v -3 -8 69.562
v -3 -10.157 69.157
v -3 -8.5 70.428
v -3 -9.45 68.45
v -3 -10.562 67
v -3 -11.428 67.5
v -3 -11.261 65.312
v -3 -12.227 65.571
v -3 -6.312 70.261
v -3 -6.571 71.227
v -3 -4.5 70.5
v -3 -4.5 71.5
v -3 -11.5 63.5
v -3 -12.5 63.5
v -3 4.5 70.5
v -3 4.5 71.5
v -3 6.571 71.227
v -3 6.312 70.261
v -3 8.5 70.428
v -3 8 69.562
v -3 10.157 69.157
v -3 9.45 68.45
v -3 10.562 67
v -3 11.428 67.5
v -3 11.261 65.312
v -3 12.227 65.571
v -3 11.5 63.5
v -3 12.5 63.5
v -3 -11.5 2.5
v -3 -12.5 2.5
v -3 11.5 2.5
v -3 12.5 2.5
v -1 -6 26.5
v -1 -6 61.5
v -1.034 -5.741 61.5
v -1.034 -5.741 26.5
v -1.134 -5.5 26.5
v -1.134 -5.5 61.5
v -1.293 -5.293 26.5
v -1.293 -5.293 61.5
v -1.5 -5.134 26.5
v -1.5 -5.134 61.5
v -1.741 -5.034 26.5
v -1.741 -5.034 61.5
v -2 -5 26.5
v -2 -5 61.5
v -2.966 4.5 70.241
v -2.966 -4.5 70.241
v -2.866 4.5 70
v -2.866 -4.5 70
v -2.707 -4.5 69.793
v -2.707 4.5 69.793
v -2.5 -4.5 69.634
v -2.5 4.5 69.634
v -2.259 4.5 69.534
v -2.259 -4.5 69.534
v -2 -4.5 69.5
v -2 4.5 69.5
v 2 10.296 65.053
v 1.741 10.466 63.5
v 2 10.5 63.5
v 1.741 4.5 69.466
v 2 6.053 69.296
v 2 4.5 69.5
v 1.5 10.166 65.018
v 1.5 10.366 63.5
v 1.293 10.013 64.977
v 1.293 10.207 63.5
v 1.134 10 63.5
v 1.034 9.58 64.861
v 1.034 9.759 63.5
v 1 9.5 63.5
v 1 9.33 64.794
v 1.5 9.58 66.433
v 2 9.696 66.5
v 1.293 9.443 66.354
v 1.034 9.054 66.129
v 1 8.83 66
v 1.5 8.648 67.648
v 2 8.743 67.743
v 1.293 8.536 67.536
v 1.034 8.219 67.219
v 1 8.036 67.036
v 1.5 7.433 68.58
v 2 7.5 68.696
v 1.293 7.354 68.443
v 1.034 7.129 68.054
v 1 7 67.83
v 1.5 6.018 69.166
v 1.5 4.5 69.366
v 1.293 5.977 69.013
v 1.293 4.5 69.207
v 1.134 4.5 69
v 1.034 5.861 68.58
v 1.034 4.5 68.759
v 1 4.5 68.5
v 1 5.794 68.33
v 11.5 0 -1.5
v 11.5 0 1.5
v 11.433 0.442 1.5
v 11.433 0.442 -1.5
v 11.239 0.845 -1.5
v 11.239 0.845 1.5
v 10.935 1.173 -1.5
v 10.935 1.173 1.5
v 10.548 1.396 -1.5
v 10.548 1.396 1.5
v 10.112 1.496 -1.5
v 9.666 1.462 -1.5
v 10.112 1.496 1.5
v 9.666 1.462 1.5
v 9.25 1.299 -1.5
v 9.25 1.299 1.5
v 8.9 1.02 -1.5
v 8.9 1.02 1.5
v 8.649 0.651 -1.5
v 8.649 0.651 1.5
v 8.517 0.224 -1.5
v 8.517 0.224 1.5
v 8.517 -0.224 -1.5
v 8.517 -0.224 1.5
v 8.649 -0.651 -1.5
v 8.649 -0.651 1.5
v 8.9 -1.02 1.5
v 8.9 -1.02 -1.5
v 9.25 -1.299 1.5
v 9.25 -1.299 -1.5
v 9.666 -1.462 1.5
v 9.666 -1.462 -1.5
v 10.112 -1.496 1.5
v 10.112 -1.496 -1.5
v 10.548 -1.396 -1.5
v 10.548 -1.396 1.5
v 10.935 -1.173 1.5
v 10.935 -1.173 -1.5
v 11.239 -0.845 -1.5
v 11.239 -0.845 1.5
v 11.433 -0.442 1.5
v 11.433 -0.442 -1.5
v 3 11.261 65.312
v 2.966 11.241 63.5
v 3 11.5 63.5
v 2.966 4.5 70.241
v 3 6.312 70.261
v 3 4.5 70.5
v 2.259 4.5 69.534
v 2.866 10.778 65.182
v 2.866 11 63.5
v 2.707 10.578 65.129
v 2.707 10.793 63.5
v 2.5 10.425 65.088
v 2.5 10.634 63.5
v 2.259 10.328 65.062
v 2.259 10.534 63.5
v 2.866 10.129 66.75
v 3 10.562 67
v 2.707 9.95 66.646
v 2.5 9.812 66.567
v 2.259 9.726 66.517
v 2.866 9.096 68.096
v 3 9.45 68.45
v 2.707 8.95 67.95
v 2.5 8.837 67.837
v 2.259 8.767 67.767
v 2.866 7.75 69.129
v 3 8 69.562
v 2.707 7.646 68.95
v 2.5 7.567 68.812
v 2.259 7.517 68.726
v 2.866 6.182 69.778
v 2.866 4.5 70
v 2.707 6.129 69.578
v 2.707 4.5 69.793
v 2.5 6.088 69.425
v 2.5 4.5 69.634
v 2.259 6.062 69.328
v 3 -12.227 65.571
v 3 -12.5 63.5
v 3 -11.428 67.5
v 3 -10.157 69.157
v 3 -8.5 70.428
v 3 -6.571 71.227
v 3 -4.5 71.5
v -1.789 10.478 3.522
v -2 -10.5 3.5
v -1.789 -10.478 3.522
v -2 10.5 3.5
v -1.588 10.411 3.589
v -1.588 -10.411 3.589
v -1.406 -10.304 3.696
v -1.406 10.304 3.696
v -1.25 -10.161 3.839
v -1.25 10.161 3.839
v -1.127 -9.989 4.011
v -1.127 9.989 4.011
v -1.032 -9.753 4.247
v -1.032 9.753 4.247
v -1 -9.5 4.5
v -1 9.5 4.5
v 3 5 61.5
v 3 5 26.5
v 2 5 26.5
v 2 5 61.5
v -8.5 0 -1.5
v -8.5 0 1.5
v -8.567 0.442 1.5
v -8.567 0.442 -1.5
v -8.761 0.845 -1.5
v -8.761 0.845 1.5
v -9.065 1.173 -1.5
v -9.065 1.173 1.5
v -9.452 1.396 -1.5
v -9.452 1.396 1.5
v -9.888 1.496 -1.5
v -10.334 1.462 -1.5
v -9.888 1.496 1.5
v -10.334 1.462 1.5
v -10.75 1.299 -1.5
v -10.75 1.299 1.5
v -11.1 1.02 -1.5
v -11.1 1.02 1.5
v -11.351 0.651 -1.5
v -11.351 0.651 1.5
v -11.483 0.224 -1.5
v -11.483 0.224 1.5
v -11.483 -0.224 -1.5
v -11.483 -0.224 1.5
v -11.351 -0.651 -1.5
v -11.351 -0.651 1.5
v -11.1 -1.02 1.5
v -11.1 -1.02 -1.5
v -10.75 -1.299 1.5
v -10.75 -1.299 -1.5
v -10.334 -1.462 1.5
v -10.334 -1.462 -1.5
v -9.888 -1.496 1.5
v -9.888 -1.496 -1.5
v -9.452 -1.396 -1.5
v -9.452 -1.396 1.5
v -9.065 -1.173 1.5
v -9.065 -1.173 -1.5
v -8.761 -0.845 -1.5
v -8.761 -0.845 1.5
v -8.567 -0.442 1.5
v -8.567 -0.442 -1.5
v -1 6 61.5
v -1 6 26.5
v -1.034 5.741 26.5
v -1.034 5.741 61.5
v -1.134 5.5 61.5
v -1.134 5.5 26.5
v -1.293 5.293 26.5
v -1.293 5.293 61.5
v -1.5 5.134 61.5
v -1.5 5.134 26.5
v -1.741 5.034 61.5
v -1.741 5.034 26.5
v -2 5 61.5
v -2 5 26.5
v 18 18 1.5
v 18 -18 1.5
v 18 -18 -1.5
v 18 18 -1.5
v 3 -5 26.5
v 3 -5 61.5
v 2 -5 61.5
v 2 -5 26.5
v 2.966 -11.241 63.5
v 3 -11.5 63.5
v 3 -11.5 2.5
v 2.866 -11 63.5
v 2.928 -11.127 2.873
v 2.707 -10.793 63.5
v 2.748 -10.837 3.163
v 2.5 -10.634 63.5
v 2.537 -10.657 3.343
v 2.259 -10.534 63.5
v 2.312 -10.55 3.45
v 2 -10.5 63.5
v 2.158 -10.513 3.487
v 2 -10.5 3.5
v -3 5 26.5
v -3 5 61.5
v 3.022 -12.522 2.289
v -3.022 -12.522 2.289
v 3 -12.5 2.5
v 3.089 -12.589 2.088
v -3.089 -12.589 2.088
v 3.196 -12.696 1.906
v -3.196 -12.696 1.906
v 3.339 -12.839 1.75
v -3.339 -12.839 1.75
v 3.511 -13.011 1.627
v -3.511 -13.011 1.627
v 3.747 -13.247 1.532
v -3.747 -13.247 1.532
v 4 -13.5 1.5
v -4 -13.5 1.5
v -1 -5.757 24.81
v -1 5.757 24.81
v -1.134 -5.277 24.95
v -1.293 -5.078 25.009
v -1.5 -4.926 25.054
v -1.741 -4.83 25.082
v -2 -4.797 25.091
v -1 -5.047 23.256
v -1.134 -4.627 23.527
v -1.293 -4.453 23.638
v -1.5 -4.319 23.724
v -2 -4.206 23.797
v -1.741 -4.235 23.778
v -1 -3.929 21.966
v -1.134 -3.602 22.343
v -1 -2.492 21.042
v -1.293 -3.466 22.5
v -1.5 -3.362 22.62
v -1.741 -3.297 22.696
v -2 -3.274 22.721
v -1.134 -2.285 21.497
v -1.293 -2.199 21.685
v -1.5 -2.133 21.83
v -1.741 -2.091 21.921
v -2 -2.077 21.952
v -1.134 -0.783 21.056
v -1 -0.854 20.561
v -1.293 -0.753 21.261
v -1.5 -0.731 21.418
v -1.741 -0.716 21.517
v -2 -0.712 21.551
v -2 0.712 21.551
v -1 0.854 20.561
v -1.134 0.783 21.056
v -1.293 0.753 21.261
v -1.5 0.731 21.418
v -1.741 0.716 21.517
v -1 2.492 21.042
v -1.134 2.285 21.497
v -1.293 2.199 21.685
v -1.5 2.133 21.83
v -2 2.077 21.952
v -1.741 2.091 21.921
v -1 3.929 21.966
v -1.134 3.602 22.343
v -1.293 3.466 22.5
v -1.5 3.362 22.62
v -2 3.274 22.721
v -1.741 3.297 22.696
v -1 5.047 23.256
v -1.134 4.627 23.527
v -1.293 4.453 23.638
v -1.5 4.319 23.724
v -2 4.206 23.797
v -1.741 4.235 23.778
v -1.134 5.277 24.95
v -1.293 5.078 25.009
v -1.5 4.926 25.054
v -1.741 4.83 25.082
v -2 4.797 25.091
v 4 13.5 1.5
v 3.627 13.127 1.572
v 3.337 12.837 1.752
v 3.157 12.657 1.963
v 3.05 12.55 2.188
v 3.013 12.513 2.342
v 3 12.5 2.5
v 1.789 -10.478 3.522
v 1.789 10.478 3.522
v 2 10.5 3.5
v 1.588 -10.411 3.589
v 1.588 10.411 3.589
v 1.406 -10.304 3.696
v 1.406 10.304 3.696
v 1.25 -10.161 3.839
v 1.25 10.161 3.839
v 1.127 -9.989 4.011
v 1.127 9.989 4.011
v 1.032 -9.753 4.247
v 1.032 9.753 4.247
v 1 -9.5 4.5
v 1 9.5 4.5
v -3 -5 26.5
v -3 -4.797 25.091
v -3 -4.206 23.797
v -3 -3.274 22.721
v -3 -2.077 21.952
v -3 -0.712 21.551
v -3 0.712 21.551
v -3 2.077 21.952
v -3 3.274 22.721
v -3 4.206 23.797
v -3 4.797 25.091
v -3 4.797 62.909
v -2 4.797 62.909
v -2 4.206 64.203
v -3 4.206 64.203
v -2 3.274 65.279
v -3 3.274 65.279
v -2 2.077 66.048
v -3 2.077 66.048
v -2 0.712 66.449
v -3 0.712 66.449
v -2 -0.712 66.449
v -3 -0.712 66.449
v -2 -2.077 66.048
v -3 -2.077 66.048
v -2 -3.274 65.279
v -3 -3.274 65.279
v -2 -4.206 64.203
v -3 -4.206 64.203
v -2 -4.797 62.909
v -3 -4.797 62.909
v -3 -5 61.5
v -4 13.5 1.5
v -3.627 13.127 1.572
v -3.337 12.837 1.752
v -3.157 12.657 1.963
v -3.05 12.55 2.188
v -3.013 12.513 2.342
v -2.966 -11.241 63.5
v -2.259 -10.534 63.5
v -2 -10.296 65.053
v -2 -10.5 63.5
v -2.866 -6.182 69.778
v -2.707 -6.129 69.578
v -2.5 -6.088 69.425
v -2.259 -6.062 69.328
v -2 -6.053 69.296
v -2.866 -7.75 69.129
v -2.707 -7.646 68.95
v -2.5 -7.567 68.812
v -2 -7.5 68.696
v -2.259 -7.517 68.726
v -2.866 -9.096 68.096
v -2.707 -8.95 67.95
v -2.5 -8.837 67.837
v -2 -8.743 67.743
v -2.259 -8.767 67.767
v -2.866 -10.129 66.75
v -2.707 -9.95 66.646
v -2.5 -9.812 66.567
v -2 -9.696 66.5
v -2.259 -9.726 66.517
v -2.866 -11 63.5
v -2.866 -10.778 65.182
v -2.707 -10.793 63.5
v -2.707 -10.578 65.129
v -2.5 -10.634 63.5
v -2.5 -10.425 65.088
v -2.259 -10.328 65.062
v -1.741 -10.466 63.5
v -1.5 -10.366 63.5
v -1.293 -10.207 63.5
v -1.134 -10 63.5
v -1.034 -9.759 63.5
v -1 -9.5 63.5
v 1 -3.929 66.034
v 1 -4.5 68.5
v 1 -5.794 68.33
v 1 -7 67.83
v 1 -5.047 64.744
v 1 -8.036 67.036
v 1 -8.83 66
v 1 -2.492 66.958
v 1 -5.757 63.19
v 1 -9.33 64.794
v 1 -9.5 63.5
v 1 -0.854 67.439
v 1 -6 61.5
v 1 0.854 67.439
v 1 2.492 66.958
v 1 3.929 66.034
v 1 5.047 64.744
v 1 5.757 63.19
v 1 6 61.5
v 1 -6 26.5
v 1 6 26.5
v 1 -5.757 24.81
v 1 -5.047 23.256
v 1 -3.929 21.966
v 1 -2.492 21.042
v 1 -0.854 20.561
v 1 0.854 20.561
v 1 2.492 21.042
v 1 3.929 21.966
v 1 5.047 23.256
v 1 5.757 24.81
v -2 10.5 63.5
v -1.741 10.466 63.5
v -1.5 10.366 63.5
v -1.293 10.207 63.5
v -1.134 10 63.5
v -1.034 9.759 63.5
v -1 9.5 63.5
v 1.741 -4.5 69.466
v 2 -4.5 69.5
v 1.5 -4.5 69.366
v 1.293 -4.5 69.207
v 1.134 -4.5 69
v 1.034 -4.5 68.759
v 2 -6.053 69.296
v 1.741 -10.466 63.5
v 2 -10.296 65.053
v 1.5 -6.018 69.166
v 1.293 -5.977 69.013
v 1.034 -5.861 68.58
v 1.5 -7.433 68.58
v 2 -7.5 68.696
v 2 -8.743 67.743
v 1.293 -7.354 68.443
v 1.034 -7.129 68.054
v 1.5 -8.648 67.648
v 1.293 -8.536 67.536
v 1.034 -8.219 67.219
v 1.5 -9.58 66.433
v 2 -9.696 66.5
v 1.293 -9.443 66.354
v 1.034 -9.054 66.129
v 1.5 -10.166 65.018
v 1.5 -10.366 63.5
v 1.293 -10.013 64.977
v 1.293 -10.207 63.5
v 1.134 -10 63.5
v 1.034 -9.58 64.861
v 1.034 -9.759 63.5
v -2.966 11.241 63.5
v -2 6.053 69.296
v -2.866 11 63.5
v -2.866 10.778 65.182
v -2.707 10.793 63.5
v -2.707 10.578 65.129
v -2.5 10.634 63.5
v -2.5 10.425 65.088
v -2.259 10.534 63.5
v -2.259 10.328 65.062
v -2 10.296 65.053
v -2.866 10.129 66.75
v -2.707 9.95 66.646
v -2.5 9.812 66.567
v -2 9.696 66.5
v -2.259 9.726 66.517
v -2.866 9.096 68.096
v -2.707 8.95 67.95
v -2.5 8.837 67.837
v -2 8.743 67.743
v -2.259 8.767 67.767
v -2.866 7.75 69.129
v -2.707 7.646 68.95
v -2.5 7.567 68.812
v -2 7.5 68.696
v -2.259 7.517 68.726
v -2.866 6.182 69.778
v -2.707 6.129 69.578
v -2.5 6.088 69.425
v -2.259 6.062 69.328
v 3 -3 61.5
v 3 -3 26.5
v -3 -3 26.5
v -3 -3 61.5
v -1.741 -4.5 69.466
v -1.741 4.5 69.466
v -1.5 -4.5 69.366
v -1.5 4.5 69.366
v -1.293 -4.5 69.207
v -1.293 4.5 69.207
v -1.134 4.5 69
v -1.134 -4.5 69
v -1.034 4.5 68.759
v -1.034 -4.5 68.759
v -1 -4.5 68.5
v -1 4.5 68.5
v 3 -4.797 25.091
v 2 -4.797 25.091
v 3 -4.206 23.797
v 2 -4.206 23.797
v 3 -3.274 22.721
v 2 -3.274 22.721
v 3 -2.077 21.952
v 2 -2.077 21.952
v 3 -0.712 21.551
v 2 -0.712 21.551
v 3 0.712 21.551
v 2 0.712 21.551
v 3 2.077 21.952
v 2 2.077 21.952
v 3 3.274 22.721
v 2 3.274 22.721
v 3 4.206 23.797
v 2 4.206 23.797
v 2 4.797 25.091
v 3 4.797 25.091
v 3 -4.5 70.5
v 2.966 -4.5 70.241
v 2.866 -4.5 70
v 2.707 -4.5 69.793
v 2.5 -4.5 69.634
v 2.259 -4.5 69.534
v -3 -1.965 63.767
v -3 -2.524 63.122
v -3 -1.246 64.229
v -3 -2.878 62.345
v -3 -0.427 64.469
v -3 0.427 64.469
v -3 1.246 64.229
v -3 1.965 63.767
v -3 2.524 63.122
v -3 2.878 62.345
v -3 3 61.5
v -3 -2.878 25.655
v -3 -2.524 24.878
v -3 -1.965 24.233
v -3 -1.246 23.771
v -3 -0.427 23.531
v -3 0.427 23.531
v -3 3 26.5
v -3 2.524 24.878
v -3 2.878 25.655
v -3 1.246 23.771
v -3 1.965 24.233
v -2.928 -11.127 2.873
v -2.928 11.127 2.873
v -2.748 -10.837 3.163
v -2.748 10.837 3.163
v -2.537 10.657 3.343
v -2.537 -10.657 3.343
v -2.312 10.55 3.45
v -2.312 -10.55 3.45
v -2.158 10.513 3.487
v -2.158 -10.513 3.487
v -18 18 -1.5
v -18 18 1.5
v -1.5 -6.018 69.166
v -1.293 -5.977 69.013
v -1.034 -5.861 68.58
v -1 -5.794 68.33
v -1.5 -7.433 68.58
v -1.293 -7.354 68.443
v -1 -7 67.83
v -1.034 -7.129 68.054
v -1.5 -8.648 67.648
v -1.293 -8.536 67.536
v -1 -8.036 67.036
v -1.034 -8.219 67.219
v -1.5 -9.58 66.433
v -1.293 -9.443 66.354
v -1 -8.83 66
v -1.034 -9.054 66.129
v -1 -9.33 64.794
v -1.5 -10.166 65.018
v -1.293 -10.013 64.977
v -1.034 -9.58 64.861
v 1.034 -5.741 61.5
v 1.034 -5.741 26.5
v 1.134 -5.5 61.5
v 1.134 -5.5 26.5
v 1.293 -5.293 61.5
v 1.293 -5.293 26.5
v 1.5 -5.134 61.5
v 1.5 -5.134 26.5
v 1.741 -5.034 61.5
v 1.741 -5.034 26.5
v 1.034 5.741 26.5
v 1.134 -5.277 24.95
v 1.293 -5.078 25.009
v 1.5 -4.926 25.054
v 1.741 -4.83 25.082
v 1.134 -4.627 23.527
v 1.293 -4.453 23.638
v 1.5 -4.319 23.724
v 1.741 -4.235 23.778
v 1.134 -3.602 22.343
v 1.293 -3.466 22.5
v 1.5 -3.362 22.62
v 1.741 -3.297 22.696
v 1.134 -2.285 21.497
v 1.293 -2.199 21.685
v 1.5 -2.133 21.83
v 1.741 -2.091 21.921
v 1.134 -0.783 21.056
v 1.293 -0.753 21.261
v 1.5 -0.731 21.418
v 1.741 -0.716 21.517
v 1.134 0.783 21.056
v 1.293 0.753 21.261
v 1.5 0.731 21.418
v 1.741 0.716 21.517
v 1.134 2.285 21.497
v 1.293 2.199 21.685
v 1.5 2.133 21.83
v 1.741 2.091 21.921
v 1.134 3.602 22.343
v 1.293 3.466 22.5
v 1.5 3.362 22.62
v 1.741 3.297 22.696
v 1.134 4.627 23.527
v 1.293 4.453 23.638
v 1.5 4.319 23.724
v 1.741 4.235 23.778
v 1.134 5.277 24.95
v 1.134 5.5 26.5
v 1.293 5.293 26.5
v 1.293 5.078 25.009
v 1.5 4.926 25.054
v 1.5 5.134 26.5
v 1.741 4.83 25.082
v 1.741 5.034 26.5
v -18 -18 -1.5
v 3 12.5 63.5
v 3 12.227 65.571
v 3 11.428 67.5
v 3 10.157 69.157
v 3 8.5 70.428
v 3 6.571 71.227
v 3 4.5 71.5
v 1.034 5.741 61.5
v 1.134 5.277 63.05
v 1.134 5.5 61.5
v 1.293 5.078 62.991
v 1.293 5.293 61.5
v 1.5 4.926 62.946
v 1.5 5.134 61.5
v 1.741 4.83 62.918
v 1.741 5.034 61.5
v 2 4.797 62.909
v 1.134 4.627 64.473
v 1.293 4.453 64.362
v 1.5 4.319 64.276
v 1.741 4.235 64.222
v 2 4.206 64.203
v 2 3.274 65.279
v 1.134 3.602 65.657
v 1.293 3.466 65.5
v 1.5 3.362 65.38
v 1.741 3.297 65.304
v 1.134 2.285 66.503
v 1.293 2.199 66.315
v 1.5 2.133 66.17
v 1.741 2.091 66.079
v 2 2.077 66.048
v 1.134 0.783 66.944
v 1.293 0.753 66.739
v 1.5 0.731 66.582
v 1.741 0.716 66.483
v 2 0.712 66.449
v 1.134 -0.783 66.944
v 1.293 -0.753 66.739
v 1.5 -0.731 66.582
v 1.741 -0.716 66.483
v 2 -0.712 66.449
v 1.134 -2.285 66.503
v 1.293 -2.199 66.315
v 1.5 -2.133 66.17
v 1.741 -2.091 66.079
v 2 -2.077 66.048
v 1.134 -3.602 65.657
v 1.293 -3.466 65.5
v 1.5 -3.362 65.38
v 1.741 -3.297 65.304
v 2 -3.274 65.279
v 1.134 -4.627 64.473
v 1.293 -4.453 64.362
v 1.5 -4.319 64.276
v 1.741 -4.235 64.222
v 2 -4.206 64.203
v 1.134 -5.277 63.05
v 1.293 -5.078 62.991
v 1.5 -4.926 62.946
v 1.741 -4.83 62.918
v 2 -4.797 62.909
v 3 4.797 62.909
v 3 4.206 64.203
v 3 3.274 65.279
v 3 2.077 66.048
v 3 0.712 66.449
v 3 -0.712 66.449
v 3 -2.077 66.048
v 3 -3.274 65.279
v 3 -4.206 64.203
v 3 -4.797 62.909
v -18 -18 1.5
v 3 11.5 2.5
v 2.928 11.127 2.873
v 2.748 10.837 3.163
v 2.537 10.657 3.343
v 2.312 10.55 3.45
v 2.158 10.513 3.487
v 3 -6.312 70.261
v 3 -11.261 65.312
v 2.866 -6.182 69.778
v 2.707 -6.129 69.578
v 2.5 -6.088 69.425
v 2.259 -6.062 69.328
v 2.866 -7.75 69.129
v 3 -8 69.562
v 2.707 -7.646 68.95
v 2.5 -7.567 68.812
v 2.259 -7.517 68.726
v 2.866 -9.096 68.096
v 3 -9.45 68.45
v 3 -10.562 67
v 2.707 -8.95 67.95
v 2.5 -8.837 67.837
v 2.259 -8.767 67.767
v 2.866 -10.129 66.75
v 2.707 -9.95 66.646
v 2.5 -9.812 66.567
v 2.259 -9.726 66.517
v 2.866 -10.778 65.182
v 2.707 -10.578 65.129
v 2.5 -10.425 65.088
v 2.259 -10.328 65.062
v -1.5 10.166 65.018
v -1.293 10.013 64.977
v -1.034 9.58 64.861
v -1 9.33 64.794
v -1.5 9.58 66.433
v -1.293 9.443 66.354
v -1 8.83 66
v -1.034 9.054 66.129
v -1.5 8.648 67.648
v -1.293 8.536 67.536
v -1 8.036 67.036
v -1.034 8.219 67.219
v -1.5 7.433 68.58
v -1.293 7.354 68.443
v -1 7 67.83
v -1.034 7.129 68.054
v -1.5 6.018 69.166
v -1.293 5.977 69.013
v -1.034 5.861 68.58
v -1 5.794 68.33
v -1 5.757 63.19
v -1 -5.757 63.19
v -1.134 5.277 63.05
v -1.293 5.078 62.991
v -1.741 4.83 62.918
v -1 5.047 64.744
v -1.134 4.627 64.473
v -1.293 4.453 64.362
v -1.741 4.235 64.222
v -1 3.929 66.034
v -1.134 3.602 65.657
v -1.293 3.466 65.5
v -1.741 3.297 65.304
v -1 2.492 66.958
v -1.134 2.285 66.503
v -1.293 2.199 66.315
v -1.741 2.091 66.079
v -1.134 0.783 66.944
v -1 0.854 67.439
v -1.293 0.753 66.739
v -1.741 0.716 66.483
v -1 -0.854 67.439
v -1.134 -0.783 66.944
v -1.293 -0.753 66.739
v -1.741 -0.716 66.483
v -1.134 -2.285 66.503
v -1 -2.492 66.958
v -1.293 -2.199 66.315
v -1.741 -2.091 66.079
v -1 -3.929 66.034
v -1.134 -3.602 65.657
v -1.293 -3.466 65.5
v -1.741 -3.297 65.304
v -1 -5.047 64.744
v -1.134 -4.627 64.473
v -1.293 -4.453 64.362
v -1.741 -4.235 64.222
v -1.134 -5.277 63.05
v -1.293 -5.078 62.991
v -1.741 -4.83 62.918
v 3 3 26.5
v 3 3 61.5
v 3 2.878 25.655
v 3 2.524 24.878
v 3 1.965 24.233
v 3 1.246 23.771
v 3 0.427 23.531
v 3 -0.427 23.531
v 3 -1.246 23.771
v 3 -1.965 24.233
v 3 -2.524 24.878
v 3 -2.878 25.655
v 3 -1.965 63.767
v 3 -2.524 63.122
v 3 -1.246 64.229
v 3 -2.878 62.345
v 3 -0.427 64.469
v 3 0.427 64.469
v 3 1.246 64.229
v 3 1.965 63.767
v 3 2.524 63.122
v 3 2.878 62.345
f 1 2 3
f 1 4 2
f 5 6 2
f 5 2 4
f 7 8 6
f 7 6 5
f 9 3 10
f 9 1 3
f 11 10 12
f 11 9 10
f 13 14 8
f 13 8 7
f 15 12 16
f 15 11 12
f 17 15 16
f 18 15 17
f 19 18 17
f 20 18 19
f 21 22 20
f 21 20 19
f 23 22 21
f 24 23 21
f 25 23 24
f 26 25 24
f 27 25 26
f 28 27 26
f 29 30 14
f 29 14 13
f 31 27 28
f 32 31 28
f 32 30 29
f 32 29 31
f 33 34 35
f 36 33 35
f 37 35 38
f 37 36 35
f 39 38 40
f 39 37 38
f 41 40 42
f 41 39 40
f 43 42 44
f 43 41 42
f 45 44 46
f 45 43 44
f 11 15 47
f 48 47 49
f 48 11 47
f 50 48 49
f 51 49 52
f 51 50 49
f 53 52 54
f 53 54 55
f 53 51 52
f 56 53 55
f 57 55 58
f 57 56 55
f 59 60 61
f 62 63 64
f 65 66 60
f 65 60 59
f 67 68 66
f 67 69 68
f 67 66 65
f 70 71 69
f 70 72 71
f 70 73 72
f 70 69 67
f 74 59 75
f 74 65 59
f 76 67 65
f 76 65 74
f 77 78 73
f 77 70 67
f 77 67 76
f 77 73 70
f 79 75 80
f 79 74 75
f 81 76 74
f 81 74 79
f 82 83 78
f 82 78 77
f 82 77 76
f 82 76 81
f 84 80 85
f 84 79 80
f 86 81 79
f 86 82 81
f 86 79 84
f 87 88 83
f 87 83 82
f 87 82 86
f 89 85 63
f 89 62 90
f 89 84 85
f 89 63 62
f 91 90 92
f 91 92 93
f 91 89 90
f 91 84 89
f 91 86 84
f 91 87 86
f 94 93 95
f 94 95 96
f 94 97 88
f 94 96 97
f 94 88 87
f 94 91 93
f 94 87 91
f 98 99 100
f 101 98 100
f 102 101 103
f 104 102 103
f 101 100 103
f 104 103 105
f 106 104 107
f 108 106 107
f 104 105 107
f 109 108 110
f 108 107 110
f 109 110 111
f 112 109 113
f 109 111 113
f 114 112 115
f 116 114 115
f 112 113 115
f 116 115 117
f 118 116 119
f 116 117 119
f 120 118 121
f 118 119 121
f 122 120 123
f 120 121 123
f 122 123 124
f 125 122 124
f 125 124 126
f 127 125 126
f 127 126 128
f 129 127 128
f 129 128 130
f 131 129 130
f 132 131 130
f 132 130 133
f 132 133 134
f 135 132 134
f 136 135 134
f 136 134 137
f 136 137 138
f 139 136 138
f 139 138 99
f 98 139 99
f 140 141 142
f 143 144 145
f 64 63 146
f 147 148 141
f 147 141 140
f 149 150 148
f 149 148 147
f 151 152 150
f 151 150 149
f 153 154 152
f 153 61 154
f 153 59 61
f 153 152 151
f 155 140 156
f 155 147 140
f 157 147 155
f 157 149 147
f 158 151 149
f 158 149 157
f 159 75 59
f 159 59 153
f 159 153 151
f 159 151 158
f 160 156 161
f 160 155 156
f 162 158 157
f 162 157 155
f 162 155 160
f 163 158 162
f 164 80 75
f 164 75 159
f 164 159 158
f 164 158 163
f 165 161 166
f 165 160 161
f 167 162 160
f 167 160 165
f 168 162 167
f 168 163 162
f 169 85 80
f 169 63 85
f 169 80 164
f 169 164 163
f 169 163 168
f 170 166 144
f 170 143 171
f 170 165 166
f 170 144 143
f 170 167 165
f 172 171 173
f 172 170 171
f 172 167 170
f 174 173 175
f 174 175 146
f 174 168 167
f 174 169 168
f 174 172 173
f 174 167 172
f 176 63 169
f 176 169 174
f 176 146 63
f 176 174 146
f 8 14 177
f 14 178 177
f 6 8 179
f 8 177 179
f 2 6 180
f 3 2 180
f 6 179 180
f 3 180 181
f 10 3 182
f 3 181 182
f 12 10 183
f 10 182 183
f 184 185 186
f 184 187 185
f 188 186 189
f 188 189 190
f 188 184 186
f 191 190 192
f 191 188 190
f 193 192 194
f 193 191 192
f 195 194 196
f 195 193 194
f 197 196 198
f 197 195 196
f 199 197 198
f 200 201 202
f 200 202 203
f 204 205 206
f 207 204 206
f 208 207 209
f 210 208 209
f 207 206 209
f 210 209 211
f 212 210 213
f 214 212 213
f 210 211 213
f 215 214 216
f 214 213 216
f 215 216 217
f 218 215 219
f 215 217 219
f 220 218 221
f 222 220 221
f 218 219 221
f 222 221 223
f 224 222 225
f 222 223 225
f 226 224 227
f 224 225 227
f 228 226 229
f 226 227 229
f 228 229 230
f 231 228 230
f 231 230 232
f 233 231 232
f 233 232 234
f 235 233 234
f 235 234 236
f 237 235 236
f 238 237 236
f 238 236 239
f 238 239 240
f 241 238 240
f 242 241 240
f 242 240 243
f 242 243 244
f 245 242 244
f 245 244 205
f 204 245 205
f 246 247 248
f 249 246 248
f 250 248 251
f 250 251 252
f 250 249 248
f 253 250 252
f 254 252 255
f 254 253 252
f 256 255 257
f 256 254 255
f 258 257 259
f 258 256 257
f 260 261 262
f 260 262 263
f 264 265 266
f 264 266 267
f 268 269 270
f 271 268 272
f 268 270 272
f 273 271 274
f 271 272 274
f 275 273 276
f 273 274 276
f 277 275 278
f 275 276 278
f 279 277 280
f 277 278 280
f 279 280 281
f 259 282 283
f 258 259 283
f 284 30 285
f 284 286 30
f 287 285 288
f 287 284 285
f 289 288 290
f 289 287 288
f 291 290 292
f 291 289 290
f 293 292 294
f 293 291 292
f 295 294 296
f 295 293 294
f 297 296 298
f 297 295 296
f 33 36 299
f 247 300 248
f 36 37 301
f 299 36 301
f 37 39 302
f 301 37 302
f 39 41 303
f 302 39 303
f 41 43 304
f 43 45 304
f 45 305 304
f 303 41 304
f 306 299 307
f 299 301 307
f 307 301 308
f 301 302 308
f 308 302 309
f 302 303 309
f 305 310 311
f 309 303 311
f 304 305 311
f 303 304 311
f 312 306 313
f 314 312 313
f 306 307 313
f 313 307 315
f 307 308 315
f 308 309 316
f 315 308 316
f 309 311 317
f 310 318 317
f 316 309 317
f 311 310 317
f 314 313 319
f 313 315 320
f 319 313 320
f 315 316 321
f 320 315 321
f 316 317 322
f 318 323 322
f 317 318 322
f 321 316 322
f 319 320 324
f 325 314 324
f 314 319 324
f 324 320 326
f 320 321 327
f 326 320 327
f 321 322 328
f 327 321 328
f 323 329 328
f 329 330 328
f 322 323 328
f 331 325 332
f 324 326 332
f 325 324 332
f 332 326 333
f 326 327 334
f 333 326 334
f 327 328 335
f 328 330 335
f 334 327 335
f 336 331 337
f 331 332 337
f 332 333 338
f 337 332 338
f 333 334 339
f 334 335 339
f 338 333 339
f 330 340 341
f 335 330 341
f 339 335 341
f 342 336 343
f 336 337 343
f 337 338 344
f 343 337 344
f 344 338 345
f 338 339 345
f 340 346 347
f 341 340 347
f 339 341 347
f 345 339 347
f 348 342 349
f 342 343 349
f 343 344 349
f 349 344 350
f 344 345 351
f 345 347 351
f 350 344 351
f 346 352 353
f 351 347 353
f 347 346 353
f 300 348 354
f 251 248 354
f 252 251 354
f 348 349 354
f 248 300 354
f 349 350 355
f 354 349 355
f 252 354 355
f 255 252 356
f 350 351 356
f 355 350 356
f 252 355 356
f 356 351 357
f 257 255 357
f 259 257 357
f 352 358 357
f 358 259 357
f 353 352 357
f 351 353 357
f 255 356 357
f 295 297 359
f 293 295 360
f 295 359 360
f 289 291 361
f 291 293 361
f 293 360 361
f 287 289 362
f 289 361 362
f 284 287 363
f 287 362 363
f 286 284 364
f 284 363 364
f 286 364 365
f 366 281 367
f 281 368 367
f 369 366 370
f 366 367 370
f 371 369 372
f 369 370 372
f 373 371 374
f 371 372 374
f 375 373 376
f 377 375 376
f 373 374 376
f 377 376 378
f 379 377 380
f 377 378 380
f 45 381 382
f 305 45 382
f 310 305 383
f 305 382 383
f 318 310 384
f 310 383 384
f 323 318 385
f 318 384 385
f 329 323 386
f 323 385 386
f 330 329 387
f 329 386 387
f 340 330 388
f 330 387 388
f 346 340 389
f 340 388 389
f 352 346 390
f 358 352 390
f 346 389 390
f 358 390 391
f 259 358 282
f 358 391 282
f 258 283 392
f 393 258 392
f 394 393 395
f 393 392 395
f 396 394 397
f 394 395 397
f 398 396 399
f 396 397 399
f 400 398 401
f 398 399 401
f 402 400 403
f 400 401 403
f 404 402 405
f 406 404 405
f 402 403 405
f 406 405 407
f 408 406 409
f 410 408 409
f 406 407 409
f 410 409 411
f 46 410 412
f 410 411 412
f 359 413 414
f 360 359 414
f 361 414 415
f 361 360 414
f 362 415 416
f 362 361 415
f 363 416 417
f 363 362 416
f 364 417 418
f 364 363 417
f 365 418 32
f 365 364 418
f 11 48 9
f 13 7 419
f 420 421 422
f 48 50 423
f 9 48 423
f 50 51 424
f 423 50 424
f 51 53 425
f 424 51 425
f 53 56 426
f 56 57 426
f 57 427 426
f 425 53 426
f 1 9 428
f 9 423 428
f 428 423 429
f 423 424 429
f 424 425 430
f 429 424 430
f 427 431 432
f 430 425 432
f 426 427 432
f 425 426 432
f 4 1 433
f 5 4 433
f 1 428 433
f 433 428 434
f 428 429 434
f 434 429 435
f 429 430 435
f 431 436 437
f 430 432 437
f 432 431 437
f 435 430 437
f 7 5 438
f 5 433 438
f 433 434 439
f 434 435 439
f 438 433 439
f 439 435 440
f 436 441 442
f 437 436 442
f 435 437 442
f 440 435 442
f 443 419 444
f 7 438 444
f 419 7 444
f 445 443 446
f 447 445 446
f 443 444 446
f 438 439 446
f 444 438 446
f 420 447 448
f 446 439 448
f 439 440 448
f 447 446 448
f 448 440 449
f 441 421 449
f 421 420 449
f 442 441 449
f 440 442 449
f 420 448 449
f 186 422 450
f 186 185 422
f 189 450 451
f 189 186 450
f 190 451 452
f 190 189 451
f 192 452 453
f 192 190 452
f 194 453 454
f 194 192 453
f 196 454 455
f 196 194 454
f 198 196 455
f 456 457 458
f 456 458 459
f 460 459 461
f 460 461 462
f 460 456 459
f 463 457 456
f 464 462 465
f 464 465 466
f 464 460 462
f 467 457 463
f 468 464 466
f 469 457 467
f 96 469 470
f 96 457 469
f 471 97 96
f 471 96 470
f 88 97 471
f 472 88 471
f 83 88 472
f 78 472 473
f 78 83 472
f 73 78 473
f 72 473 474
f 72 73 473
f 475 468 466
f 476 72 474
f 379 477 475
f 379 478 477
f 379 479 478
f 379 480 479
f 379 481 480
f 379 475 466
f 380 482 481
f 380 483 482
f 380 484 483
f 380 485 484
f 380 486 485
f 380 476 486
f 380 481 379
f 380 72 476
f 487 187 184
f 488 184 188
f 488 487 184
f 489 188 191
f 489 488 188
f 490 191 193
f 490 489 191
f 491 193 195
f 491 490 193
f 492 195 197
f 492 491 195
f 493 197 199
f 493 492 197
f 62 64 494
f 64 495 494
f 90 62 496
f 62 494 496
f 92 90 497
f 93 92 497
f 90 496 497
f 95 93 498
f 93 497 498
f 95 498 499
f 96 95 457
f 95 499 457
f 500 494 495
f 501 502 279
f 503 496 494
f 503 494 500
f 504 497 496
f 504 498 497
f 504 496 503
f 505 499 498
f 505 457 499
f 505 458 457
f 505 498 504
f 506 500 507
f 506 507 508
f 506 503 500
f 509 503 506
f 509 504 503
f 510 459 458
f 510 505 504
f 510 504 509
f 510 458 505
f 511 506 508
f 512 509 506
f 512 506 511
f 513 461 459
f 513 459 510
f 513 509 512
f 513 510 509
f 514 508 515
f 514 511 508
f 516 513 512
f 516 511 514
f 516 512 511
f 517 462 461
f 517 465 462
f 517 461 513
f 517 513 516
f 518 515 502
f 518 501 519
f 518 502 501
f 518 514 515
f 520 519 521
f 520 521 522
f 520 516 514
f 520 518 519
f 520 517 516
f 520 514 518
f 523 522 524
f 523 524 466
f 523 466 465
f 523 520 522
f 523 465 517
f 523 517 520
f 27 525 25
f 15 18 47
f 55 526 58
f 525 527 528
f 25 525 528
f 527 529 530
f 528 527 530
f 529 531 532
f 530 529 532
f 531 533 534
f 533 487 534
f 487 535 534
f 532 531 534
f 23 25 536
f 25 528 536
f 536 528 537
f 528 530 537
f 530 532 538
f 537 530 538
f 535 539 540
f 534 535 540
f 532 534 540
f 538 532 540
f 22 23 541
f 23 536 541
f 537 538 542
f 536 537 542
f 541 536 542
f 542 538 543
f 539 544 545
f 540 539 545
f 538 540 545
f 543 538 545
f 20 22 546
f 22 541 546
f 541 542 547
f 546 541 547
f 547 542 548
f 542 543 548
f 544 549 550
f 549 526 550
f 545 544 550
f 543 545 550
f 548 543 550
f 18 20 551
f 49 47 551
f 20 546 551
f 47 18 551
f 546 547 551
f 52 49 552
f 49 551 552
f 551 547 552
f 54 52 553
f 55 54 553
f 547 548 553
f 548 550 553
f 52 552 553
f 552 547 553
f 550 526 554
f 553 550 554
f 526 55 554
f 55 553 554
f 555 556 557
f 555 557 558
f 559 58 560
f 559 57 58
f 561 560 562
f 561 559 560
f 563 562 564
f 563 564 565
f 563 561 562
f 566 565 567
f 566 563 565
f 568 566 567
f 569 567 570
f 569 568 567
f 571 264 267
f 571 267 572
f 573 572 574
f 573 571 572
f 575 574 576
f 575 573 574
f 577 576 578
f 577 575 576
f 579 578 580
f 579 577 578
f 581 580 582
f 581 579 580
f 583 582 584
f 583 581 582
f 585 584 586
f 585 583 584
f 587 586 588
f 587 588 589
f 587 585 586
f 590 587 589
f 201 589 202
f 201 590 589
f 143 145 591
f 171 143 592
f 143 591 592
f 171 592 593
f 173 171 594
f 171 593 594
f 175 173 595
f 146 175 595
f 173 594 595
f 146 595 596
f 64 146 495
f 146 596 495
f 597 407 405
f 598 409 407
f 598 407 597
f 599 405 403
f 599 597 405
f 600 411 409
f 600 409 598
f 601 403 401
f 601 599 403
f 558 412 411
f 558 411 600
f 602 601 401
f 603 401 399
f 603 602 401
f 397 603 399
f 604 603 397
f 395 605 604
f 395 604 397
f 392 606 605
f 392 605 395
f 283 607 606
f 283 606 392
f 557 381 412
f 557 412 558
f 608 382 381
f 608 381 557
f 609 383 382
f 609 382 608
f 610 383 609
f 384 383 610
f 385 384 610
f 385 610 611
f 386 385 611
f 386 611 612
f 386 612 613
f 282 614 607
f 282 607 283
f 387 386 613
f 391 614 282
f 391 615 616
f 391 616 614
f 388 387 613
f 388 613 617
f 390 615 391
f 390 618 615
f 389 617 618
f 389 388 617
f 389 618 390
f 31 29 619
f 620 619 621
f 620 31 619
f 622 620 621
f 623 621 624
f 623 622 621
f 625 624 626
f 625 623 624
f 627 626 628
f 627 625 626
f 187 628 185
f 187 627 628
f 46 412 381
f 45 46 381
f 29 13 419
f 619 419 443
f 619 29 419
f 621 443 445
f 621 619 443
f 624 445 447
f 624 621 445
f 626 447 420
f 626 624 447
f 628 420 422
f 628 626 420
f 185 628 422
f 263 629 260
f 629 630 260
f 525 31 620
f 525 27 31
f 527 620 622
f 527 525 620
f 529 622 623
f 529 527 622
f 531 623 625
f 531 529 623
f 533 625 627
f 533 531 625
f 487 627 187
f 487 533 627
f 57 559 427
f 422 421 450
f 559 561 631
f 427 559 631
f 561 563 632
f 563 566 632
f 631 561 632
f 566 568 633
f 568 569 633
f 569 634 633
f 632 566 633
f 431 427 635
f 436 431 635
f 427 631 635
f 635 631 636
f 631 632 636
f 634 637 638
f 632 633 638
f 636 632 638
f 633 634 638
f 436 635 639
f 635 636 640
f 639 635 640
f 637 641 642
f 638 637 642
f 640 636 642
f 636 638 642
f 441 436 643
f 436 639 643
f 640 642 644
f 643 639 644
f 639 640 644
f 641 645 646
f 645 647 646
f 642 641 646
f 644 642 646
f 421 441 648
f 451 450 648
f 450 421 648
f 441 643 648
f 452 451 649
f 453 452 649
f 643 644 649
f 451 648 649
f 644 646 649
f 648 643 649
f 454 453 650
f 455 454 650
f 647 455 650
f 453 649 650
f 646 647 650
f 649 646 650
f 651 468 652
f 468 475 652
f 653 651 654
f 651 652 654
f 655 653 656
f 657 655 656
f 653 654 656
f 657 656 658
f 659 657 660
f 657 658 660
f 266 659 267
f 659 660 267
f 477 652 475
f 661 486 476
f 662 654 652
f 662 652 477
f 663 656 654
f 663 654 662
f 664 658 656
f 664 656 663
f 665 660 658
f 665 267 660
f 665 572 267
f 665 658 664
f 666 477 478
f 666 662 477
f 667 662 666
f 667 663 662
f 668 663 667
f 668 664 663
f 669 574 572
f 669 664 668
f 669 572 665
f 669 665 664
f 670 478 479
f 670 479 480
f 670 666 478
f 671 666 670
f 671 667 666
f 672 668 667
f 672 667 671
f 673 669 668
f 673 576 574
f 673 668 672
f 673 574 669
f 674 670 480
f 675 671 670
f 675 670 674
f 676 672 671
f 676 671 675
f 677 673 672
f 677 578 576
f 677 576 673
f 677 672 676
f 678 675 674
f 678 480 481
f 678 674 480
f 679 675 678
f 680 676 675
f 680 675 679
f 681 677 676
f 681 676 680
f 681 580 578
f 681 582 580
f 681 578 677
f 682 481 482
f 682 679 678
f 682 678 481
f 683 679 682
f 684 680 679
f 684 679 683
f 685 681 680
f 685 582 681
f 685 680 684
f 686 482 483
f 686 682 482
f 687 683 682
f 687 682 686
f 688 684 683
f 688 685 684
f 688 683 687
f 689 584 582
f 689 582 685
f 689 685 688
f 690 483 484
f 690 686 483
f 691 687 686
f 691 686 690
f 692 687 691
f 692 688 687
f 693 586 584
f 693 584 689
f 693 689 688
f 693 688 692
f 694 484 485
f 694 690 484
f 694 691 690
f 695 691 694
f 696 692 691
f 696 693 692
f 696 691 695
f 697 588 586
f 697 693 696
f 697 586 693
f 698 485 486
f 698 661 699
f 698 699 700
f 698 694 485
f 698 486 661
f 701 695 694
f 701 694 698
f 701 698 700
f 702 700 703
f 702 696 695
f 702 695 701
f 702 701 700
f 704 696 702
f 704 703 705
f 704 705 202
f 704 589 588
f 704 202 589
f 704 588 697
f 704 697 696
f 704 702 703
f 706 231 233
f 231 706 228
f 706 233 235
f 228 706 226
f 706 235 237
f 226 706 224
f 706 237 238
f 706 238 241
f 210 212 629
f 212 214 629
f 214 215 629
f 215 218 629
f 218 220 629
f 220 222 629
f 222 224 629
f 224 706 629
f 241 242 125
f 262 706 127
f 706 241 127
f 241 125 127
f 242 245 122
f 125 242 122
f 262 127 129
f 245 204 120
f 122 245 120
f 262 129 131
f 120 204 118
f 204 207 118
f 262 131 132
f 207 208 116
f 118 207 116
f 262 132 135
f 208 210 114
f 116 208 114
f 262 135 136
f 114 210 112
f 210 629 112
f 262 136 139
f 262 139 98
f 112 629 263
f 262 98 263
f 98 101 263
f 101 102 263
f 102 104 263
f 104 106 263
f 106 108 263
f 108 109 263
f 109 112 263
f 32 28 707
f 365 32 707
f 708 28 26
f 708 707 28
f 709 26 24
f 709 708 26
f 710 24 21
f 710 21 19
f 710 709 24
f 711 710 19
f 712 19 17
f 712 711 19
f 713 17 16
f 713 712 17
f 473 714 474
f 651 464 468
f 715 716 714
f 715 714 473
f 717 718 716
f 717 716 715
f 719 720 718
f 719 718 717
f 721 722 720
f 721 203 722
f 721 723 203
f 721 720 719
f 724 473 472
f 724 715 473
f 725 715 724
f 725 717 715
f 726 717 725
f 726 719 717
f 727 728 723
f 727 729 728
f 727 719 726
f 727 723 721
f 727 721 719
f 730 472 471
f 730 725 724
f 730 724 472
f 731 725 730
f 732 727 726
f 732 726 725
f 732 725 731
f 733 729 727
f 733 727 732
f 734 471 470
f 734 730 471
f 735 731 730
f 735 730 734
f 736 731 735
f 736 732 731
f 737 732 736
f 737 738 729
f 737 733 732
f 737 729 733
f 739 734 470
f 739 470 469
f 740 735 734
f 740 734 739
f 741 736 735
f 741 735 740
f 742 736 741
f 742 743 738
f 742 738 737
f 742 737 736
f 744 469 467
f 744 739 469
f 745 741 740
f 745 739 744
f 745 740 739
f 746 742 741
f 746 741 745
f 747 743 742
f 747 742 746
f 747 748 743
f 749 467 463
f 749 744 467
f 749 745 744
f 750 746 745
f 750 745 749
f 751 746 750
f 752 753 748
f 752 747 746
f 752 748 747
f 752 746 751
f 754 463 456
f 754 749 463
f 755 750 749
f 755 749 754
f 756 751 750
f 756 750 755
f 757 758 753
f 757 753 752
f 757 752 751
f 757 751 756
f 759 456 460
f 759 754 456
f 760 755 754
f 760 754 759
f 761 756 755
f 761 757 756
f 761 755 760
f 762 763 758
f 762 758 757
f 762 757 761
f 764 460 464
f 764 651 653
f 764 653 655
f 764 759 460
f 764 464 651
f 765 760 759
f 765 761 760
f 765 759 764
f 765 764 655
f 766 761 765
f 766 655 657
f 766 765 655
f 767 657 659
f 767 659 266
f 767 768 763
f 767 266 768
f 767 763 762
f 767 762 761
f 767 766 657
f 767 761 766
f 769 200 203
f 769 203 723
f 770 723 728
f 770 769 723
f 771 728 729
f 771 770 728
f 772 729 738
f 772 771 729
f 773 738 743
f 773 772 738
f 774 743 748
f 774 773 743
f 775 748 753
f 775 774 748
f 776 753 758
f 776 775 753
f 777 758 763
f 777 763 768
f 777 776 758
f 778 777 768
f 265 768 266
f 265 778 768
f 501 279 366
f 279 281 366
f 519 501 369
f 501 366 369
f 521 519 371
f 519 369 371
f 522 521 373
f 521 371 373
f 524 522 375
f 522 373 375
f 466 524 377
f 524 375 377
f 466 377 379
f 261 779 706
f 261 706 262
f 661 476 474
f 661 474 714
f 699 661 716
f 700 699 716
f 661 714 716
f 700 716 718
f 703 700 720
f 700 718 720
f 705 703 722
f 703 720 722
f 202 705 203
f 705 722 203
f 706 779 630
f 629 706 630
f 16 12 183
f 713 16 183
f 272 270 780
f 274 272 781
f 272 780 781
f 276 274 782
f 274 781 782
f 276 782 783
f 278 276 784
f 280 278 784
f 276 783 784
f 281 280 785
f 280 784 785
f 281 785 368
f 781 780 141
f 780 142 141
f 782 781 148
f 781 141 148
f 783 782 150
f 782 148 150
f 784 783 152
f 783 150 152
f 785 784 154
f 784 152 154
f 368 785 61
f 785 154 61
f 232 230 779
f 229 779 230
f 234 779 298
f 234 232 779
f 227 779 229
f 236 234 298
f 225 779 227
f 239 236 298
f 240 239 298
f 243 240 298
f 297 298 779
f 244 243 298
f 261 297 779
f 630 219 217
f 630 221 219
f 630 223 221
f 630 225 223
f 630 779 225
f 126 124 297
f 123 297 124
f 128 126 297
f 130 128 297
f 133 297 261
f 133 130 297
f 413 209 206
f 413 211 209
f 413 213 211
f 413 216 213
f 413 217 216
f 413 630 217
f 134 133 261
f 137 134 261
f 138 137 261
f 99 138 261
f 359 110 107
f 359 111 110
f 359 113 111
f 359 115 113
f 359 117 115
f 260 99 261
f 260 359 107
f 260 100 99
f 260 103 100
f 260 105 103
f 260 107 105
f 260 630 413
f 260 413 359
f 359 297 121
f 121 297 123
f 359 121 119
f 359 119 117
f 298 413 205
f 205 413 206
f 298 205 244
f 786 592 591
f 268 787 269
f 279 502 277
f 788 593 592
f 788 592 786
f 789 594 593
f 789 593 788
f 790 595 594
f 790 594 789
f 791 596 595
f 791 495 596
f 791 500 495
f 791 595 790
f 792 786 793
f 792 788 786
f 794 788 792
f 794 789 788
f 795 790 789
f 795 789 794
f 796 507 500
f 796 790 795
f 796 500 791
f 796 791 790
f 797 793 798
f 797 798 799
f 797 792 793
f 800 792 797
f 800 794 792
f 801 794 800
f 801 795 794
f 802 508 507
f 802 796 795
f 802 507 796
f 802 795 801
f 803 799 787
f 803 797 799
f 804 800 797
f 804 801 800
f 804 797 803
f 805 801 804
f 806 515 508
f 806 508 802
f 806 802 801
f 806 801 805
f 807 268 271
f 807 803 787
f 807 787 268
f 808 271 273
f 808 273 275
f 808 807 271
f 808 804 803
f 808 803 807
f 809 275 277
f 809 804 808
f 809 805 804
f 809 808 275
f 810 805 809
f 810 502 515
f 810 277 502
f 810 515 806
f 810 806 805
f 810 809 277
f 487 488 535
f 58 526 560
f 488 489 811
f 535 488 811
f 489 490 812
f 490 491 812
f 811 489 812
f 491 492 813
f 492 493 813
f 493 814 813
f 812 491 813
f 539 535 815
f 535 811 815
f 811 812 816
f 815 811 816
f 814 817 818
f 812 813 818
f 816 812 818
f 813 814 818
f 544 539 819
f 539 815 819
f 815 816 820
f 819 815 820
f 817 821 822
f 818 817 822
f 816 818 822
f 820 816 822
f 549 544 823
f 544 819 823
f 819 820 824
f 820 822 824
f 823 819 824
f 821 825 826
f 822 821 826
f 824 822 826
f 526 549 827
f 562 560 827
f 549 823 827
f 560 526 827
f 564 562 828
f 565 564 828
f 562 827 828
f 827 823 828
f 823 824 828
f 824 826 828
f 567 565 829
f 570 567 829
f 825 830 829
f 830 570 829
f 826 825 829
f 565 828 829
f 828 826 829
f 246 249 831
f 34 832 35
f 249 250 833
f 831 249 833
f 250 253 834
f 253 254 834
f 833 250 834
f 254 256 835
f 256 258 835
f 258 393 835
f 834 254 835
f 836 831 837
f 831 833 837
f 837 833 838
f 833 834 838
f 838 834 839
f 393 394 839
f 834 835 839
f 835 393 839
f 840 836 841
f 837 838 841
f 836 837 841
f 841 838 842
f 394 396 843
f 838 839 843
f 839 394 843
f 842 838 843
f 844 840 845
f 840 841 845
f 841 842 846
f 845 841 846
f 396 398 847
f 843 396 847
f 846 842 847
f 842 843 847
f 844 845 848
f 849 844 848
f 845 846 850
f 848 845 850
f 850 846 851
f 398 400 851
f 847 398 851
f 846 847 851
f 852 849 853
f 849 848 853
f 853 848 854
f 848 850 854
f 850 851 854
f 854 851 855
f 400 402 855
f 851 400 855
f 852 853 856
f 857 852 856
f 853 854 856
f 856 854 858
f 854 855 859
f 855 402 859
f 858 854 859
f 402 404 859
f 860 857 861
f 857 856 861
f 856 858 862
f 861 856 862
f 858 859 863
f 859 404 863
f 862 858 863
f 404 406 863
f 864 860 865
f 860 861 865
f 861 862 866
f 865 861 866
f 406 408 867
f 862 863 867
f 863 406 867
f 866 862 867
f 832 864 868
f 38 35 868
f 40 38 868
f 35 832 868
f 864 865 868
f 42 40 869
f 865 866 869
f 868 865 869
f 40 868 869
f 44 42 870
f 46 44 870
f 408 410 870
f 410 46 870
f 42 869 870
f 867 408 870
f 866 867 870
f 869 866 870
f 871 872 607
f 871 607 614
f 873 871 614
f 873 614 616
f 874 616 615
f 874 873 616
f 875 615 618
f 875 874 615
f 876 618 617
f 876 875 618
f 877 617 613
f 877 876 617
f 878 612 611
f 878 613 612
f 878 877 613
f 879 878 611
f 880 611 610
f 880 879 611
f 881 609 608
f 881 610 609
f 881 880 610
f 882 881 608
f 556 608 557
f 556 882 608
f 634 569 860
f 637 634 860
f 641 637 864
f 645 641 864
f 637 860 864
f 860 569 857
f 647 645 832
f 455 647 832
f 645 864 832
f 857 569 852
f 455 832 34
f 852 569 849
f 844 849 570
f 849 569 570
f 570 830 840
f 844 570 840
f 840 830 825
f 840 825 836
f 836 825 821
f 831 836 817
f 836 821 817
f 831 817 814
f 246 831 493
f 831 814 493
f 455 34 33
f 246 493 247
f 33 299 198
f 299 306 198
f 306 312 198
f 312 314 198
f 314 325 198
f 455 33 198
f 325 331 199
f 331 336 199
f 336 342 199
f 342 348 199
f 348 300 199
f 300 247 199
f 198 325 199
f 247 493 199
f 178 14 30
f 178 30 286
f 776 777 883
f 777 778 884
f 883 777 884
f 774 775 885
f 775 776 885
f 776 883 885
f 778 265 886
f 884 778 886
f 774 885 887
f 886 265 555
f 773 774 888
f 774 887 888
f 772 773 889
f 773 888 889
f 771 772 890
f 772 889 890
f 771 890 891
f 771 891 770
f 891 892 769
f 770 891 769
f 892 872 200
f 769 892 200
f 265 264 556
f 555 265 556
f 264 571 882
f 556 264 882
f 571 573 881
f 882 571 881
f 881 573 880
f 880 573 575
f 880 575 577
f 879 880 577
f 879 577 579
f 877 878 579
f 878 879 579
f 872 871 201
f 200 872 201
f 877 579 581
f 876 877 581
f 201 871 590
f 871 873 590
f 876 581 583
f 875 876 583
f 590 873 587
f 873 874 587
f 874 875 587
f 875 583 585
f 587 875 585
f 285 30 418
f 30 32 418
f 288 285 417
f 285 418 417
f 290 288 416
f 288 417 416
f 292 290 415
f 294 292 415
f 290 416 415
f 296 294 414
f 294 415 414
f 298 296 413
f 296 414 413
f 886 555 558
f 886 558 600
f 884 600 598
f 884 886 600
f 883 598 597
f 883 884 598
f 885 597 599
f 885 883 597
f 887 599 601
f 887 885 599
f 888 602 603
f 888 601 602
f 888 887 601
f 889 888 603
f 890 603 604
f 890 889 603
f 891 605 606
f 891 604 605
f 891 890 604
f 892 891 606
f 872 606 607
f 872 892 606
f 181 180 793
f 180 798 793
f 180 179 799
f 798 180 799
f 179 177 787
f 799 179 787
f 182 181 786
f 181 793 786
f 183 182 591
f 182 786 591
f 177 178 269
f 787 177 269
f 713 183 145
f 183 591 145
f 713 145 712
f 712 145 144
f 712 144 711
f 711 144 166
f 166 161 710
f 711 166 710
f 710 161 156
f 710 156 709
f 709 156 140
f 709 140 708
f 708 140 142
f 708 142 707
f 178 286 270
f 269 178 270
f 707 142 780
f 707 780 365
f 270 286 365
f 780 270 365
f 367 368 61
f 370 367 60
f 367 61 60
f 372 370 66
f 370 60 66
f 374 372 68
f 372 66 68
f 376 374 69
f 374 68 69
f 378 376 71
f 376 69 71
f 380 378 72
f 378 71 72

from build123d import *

# Parameters (mm, degrees)
SKETCH1_W           = 36
SKETCH1_H           = 36
BOSS_EXTRUDE1_DEPTH = 1.5
SKETCH2_R           = 1.5
CUT_EXTRUDE1_DEPTH  = 26.632011236
SKETCH3_W           = 6
SKETCH3_H           = 25
BOSS_EXTRUDE2_DEPTH = 70
CUT_EXTRUDE2_DEPTH  = 77.66322456
FILLET1_R           = 8
CUT_EXTRUDE3_DEPTH  = 2
FILLET4_R           = 1


with BuildPart() as part:
    # Sketch1 → Boss-Extrude1 (new, symmetric)
    with BuildSketch(Plane.XY):
        Rectangle(SKETCH1_W, SKETCH1_H)
    extrude(amount=BOSS_EXTRUDE1_DEPTH, both=True)

    # Sketch2 → Cut-Extrude1 (cut, through all)
    with BuildSketch(Plane.XY.offset(1.5)):
        with Locations((-10, 0)):
            Circle(SKETCH2_R)
        with Locations((10, 0)):
            Circle(SKETCH2_R)
    extrude(amount=-CUT_EXTRUDE1_DEPTH, mode=Mode.SUBTRACT)

    # Sketch3 → Boss-Extrude2 (add)
    with BuildSketch(Plane.XY.offset(1.5)):
        Rectangle(SKETCH3_W, SKETCH3_H)
    extrude(amount=BOSS_EXTRUDE2_DEPTH)

    # Sketch4 → Cut-Extrude2 (cut, through all)
    with BuildSketch(Plane(origin=(3, 0, 0), x_dir=(0, 0, -1), z_dir=(1, 0, 0))):
        with BuildLine():
            Line((-61.5, 3), (-26.5, 3))
            ThreePointArc((-26.5, 3), (-23.5, 0), (-26.5, -3))
            Line((-26.5, -3), (-61.5, -3))
            ThreePointArc((-61.5, -3), (-64.5, 0), (-61.5, 3))
        make_face()
    extrude(amount=-CUT_EXTRUDE2_DEPTH, mode=Mode.SUBTRACT)

    # Fillet1
    fillet1_edges = [part.edges().sort_by_distance(p)[0] for p in [
        (0, 12.5, 71.5),
        (0, -12.5, 71.5),
    ]]
    fillet(fillet1_edges, radius=FILLET1_R)

    # Sketch5 → Cut-Extrude3 (cut)
    with BuildSketch(Plane(origin=(3, 0, 0), x_dir=(0, 0, -1), z_dir=(1, 0, 0))):
        with BuildLine():
            Line((-3.5, -10.5), (-3.5, 10.5))
            Line((-3.5, 10.5), (-63.5, 10.5))
            ThreePointArc((-63.5, 10.5), (-67.742640687, 8.742640687), (-69.5, 4.5))
            Line((-69.5, 4.5), (-69.5, -4.5))
            ThreePointArc((-69.5, -4.5), (-67.742640687, -8.742640687), (-63.5, -10.5))
            Line((-63.5, -10.5), (-3.5, -10.5))
        make_face()
        with BuildLine():
            Line((-26.5, 5), (-61.5, 5))
            ThreePointArc((-61.5, 5), (-66.5, 0), (-61.5, -5))
            Line((-61.5, -5), (-26.5, -5))
            ThreePointArc((-26.5, -5), (-21.5, 0), (-26.5, 5))
        make_face(mode=Mode.SUBTRACT)
    cut_extrude3 = extrude(amount=-CUT_EXTRUDE3_DEPTH, mode=Mode.SUBTRACT)

    # Mirror1: Cut-Extrude3 across plane
    add(cut_extrude3.mirror(Plane(origin=(0, 0, 0), x_dir=(0, 0, 1), z_dir=(1, 0, 0))), mode=Mode.SUBTRACT)

    # Fillet4
    fillet4_edges = [part.edges().sort_by_distance(p)[0] for p in [
        (-3, -10.5, 33.5),
        (-3, -8.742640687, 67.742640687),
        (-3, 0, 69.5),
        (-3, 8.742640687, 67.742640687),
        (3, 10.5, 33.5),
        (3, 8.742640687, 67.742640687),
        (3, 0, 69.5),
        (3, -8.742640687, 67.742640687),
        (-1, 10.5, 33.5),
        (-1, 8.742640687, 67.742640687),
        (-1, 0, 69.5),
        (-1, -8.742640687, 67.742640687),
        (-1, -5, 44),
        (-1, 0, 66.5),
        (-1, 5, 44),
        (1, 10.5, 33.5),
        (1, 8.742640687, 67.742640687),
        (1, 0, 69.5),
        (1, -8.742640687, 67.742640687),
        (1, 0, 21.5),
        (1, -5, 44),
        (1, 0, 66.5),
        (0, 12.5, 1.5),
        (0, -12.5, 1.5),
        (-3, 0, 1.5),
        (3, 0, 1.5),
        (-3, 10.5, 33.5),
        (-3, 0, 3.5),
        (3, 0, 3.5),
        (3, -10.5, 33.5),
        (-1, 0, 3.5),
        (-1, -10.5, 33.5),
        (-1, 0, 21.5),
        (1, 0, 3.5),
        (1, -10.5, 33.5),
        (1, 5, 44),
    ]]
    fillet(fillet4_edges, radius=FILLET4_R - 0.0001)  # a hair under: the kernel refuses the full size


solid = part.part
